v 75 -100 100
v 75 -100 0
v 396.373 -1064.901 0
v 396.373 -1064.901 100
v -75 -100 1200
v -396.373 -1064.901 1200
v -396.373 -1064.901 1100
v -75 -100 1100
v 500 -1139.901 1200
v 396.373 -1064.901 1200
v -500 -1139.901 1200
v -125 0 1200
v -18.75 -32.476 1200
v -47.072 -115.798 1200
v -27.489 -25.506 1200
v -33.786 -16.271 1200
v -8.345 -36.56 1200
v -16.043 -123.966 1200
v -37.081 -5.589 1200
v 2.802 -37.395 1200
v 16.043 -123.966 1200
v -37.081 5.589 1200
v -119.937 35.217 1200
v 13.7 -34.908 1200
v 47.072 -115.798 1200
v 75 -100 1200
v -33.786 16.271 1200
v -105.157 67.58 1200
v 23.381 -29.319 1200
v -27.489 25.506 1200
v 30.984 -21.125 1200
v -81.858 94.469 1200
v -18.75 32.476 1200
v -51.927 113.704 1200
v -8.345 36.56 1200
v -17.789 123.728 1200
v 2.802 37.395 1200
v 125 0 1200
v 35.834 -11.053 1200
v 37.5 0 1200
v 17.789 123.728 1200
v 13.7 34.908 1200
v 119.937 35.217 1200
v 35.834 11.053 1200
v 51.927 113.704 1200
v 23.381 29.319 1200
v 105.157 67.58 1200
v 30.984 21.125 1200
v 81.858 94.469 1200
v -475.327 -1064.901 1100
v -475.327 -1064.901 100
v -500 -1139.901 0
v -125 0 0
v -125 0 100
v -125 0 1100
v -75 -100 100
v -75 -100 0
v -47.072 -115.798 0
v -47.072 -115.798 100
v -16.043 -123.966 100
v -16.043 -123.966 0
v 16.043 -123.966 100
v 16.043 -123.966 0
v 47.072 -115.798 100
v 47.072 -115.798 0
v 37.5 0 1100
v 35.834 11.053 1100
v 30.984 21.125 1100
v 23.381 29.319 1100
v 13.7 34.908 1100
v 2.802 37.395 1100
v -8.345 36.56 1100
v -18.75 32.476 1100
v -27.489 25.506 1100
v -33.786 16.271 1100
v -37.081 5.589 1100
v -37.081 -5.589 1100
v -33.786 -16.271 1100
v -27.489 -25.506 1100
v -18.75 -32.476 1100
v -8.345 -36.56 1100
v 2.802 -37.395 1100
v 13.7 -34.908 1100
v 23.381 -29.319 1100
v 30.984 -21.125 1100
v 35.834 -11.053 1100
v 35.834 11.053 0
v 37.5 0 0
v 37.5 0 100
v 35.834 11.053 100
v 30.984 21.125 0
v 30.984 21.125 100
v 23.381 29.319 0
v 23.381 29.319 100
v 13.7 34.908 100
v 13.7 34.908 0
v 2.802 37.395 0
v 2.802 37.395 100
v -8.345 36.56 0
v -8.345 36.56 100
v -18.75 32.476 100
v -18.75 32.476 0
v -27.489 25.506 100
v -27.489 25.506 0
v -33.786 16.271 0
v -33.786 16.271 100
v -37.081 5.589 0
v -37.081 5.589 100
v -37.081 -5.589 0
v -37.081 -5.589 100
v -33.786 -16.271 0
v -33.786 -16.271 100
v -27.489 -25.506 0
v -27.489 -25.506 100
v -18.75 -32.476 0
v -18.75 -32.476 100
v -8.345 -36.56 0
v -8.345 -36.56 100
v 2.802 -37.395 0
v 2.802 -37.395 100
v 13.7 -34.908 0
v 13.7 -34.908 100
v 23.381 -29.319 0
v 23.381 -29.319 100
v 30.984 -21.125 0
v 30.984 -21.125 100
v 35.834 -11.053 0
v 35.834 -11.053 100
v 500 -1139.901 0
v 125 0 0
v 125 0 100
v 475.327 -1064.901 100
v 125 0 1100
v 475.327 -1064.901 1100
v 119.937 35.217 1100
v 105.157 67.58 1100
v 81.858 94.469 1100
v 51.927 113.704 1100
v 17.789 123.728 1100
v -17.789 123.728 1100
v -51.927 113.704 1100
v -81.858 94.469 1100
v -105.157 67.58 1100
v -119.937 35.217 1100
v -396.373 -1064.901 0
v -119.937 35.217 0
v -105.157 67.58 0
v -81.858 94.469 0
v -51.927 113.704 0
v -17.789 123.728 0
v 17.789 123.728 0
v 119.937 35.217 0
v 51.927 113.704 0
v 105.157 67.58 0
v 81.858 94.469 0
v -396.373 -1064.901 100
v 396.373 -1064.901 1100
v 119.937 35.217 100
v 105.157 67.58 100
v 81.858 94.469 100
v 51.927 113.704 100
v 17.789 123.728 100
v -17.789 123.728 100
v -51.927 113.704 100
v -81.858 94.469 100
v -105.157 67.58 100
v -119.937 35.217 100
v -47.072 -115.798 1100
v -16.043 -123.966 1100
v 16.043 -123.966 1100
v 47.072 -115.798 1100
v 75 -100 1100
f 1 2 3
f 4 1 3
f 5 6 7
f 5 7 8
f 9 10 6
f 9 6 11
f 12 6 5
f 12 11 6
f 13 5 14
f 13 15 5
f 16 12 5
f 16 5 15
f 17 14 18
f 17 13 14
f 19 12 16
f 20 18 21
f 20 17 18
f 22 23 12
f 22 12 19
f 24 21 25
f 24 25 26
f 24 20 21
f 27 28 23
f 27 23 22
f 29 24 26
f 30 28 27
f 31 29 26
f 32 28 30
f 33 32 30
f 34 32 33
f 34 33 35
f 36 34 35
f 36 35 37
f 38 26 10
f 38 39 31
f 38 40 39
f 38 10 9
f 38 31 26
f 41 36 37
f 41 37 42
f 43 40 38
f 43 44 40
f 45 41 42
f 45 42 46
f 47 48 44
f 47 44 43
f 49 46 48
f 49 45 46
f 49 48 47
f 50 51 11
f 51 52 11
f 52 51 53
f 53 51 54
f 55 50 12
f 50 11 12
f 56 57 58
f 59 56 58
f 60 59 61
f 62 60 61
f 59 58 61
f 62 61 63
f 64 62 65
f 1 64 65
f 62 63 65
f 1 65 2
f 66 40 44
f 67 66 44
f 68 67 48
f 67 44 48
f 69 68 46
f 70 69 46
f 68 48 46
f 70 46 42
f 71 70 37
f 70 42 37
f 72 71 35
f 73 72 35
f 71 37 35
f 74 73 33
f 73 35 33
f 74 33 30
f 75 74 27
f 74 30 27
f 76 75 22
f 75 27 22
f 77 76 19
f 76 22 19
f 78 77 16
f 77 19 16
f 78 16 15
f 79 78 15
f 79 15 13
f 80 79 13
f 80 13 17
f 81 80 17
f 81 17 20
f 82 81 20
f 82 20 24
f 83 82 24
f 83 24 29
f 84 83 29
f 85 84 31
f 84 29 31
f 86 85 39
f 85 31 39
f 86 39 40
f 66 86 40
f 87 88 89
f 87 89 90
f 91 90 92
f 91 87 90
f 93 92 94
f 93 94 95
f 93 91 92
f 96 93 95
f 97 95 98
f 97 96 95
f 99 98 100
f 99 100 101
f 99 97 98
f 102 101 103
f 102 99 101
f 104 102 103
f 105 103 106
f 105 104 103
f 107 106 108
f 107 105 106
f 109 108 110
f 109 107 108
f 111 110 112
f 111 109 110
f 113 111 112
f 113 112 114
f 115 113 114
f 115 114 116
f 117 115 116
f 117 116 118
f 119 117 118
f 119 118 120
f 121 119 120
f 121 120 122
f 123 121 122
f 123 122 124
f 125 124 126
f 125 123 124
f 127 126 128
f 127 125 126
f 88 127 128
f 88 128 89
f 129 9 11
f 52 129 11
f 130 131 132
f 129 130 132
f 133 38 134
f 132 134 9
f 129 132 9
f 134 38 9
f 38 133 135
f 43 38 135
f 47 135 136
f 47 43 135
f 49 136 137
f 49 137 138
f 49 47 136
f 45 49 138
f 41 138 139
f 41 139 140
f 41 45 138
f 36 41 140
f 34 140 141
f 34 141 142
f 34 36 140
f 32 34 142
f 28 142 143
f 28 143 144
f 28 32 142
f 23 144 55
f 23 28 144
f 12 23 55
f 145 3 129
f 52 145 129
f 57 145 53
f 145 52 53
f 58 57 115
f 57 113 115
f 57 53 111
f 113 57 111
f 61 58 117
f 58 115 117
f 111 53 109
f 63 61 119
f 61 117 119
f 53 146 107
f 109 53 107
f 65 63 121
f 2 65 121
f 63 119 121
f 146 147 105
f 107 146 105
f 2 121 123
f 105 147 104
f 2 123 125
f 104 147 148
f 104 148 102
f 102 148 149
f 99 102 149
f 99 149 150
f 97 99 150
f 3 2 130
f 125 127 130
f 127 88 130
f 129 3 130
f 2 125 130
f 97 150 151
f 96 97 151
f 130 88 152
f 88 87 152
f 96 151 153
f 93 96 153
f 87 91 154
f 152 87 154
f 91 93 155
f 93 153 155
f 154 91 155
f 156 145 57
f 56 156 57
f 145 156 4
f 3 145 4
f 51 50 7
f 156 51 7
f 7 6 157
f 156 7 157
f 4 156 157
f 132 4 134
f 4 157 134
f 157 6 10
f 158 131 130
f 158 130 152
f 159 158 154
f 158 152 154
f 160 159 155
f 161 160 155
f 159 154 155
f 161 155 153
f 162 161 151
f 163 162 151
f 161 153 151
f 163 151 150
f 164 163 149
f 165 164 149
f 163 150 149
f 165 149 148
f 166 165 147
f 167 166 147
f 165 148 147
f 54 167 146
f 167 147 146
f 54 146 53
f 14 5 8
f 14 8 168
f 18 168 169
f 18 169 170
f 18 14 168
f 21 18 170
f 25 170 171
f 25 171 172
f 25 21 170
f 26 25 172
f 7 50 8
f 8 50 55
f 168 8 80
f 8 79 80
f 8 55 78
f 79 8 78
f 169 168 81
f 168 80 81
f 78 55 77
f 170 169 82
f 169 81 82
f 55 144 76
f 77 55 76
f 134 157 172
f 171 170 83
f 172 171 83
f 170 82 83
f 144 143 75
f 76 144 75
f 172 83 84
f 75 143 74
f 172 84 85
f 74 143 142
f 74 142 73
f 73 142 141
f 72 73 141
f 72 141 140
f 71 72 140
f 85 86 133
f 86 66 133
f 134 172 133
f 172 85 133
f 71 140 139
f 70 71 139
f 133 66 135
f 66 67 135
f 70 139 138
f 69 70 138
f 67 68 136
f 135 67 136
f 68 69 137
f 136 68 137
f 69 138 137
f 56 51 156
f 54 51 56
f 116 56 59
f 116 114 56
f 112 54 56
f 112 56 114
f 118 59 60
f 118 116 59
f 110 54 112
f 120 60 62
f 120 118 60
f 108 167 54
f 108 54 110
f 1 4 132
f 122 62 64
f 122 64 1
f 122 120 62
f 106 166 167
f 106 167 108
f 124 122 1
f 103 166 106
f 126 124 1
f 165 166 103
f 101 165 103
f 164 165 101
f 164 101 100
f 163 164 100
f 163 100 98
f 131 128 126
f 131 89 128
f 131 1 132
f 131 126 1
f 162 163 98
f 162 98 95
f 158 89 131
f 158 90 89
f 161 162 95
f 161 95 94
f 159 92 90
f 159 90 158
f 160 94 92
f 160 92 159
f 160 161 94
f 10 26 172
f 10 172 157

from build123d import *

# Parameters (mm, degrees)
SKETCH1_R           = 125
SKETCH1_R_2         = 37.5
BOSS_EXTRUDE1_DEPTH = 100
BOSS_EXTRUDE3_DEPTH = 500


with BuildPart() as part:
    # Sketch1 → Boss-Extrude1 (new body)
    # profile 1 of 2: a face of its own
    with BuildSketch(Plane.XY):
        with BuildLine():
            ThreePointArc((-75, -100), (-111.803398875, -55.901699437), (-125, 0))
            Line((-125, 0), (-500, -1139.901311518))
            Line((-500, -1139.901311518), (500, -1139.901311518))
            Line((500, -1139.901311518), (125, 0))
            ThreePointArc((125, 0), (111.803398875, -55.901699437), (75, -100))
            Line((75, -100), (396.372608044, -1064.901311518))
            Line((396.372608044, -1064.901311518), (-396.372608044, -1064.901311518))
            Line((-396.372608044, -1064.901311518), (-75, -100))
        make_face()
    # profile 2 of 2: a face of its own
    with BuildSketch(Plane.XY):
        Circle(SKETCH1_R)
        Circle(SKETCH1_R_2, mode=Mode.SUBTRACT)
    extrude(amount=BOSS_EXTRUDE1_DEPTH)

    # Sketch3 → Boss-Extrude3 (add)
    with BuildSketch(Plane.XY.offset(100)):
        Polygon((-500, -1139.901311518), (-475.326811439, -1064.901311518), (475.326811439, -1064.901311518), (500, -1139.901311518), align=None)
    extrude(amount=BOSS_EXTRUDE3_DEPTH)

    # Mirror2: part across plane


with BuildPart() as part_1:
    add(part.part)
    add(part.part.mirror(Plane.XY.offset(600)))


solid = part_1.part
